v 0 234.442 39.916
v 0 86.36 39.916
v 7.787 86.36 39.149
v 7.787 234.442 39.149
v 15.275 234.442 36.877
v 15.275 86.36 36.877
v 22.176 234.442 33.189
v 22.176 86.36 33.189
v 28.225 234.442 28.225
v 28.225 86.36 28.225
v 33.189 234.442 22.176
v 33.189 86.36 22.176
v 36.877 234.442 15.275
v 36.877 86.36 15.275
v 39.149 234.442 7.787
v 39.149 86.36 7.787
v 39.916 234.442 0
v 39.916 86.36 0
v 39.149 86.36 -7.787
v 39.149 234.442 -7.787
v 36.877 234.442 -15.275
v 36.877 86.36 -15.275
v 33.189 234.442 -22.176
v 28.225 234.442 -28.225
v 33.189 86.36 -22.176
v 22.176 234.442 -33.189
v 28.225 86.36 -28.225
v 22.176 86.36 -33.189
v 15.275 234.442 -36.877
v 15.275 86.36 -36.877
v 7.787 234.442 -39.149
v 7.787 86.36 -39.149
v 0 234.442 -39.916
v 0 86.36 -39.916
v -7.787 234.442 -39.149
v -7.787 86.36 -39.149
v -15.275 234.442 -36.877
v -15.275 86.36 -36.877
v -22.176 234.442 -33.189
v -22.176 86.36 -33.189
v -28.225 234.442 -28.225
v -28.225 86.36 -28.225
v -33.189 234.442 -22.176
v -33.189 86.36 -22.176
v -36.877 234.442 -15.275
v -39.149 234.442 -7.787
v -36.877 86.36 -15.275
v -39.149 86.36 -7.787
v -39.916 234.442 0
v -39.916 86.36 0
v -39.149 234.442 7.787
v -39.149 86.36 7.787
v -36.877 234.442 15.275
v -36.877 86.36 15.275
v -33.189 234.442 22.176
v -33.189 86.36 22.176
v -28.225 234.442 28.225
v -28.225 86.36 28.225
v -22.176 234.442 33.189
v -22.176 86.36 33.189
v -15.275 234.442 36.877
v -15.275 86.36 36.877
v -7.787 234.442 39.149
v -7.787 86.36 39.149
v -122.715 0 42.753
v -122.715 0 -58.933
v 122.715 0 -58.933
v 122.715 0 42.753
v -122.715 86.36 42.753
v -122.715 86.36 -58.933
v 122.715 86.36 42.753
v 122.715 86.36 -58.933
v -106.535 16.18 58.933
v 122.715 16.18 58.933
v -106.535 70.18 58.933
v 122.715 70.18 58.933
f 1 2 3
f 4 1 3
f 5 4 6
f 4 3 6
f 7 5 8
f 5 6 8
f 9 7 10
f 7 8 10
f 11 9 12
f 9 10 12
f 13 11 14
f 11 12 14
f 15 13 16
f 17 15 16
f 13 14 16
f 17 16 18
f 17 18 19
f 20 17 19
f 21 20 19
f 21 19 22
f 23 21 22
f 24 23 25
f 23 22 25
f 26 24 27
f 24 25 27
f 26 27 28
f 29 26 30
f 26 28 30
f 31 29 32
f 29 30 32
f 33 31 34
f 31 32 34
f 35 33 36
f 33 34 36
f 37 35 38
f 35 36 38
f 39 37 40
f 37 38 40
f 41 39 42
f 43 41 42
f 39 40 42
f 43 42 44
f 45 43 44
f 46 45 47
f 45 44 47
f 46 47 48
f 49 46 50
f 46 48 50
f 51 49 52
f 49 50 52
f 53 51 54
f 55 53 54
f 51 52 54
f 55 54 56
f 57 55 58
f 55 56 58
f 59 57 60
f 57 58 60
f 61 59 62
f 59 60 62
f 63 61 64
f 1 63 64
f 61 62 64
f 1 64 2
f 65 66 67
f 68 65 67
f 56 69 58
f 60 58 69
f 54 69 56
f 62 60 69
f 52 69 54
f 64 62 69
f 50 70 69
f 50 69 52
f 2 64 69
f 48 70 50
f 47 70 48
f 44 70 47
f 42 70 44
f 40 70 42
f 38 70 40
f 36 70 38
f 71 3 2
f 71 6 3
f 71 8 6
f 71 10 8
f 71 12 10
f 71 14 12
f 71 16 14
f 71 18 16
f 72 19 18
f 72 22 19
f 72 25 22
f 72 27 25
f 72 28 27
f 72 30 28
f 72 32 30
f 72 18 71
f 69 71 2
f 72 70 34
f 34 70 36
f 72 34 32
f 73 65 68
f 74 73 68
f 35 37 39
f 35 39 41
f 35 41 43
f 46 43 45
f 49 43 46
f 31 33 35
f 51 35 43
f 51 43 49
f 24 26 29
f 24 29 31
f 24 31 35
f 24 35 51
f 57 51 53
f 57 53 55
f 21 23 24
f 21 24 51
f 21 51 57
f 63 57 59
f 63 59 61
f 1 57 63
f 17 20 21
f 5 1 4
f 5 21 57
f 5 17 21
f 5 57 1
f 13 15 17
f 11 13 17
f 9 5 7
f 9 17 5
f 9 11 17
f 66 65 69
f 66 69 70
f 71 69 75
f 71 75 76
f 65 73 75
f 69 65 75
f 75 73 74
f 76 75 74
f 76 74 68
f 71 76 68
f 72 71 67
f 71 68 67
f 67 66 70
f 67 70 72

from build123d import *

# Parameters (mm, degrees)
SKETCH1_W           = 245.429281818
SKETCH1_H           = 117.865734126
BOSS_EXTRUDE1_DEPTH = 86.36
CHAMFER1_SIZE       = 16.18000066
SKETCH2_R           = 39.915781682
BOSS_EXTRUDE2_DEPTH = 148.082


with BuildPart() as part:
    # Sketch1 → Boss-Extrude1 (new body)
    with BuildSketch(Plane(origin=(0, 0, 0), x_dir=(1, 0, 0), z_dir=(0, 1, 0))):
        Rectangle(SKETCH1_W, SKETCH1_H)
    extrude(amount=BOSS_EXTRUDE1_DEPTH)

    # Chamfer1
    chamfer1_edges = [part.edges().sort_by_distance(p)[0] for p in [
        (0, 86.36, 58.932867063),
        (0, 0, 58.932867063),
        (-122.714640909, 43.18, 58.932867063),
    ]]
    chamfer(chamfer1_edges, length=CHAMFER1_SIZE)

    # Sketch2 → Boss-Extrude2 (add)
    with BuildSketch(Plane(origin=(0, 86.36, 0), x_dir=(1, 0, 0), z_dir=(0, 1, 0))):
        with Locations(Location((0, 0, 0), (0, 0, 270))):
            Circle(SKETCH2_R)
    extrude(amount=BOSS_EXTRUDE2_DEPTH)


solid = part.part
